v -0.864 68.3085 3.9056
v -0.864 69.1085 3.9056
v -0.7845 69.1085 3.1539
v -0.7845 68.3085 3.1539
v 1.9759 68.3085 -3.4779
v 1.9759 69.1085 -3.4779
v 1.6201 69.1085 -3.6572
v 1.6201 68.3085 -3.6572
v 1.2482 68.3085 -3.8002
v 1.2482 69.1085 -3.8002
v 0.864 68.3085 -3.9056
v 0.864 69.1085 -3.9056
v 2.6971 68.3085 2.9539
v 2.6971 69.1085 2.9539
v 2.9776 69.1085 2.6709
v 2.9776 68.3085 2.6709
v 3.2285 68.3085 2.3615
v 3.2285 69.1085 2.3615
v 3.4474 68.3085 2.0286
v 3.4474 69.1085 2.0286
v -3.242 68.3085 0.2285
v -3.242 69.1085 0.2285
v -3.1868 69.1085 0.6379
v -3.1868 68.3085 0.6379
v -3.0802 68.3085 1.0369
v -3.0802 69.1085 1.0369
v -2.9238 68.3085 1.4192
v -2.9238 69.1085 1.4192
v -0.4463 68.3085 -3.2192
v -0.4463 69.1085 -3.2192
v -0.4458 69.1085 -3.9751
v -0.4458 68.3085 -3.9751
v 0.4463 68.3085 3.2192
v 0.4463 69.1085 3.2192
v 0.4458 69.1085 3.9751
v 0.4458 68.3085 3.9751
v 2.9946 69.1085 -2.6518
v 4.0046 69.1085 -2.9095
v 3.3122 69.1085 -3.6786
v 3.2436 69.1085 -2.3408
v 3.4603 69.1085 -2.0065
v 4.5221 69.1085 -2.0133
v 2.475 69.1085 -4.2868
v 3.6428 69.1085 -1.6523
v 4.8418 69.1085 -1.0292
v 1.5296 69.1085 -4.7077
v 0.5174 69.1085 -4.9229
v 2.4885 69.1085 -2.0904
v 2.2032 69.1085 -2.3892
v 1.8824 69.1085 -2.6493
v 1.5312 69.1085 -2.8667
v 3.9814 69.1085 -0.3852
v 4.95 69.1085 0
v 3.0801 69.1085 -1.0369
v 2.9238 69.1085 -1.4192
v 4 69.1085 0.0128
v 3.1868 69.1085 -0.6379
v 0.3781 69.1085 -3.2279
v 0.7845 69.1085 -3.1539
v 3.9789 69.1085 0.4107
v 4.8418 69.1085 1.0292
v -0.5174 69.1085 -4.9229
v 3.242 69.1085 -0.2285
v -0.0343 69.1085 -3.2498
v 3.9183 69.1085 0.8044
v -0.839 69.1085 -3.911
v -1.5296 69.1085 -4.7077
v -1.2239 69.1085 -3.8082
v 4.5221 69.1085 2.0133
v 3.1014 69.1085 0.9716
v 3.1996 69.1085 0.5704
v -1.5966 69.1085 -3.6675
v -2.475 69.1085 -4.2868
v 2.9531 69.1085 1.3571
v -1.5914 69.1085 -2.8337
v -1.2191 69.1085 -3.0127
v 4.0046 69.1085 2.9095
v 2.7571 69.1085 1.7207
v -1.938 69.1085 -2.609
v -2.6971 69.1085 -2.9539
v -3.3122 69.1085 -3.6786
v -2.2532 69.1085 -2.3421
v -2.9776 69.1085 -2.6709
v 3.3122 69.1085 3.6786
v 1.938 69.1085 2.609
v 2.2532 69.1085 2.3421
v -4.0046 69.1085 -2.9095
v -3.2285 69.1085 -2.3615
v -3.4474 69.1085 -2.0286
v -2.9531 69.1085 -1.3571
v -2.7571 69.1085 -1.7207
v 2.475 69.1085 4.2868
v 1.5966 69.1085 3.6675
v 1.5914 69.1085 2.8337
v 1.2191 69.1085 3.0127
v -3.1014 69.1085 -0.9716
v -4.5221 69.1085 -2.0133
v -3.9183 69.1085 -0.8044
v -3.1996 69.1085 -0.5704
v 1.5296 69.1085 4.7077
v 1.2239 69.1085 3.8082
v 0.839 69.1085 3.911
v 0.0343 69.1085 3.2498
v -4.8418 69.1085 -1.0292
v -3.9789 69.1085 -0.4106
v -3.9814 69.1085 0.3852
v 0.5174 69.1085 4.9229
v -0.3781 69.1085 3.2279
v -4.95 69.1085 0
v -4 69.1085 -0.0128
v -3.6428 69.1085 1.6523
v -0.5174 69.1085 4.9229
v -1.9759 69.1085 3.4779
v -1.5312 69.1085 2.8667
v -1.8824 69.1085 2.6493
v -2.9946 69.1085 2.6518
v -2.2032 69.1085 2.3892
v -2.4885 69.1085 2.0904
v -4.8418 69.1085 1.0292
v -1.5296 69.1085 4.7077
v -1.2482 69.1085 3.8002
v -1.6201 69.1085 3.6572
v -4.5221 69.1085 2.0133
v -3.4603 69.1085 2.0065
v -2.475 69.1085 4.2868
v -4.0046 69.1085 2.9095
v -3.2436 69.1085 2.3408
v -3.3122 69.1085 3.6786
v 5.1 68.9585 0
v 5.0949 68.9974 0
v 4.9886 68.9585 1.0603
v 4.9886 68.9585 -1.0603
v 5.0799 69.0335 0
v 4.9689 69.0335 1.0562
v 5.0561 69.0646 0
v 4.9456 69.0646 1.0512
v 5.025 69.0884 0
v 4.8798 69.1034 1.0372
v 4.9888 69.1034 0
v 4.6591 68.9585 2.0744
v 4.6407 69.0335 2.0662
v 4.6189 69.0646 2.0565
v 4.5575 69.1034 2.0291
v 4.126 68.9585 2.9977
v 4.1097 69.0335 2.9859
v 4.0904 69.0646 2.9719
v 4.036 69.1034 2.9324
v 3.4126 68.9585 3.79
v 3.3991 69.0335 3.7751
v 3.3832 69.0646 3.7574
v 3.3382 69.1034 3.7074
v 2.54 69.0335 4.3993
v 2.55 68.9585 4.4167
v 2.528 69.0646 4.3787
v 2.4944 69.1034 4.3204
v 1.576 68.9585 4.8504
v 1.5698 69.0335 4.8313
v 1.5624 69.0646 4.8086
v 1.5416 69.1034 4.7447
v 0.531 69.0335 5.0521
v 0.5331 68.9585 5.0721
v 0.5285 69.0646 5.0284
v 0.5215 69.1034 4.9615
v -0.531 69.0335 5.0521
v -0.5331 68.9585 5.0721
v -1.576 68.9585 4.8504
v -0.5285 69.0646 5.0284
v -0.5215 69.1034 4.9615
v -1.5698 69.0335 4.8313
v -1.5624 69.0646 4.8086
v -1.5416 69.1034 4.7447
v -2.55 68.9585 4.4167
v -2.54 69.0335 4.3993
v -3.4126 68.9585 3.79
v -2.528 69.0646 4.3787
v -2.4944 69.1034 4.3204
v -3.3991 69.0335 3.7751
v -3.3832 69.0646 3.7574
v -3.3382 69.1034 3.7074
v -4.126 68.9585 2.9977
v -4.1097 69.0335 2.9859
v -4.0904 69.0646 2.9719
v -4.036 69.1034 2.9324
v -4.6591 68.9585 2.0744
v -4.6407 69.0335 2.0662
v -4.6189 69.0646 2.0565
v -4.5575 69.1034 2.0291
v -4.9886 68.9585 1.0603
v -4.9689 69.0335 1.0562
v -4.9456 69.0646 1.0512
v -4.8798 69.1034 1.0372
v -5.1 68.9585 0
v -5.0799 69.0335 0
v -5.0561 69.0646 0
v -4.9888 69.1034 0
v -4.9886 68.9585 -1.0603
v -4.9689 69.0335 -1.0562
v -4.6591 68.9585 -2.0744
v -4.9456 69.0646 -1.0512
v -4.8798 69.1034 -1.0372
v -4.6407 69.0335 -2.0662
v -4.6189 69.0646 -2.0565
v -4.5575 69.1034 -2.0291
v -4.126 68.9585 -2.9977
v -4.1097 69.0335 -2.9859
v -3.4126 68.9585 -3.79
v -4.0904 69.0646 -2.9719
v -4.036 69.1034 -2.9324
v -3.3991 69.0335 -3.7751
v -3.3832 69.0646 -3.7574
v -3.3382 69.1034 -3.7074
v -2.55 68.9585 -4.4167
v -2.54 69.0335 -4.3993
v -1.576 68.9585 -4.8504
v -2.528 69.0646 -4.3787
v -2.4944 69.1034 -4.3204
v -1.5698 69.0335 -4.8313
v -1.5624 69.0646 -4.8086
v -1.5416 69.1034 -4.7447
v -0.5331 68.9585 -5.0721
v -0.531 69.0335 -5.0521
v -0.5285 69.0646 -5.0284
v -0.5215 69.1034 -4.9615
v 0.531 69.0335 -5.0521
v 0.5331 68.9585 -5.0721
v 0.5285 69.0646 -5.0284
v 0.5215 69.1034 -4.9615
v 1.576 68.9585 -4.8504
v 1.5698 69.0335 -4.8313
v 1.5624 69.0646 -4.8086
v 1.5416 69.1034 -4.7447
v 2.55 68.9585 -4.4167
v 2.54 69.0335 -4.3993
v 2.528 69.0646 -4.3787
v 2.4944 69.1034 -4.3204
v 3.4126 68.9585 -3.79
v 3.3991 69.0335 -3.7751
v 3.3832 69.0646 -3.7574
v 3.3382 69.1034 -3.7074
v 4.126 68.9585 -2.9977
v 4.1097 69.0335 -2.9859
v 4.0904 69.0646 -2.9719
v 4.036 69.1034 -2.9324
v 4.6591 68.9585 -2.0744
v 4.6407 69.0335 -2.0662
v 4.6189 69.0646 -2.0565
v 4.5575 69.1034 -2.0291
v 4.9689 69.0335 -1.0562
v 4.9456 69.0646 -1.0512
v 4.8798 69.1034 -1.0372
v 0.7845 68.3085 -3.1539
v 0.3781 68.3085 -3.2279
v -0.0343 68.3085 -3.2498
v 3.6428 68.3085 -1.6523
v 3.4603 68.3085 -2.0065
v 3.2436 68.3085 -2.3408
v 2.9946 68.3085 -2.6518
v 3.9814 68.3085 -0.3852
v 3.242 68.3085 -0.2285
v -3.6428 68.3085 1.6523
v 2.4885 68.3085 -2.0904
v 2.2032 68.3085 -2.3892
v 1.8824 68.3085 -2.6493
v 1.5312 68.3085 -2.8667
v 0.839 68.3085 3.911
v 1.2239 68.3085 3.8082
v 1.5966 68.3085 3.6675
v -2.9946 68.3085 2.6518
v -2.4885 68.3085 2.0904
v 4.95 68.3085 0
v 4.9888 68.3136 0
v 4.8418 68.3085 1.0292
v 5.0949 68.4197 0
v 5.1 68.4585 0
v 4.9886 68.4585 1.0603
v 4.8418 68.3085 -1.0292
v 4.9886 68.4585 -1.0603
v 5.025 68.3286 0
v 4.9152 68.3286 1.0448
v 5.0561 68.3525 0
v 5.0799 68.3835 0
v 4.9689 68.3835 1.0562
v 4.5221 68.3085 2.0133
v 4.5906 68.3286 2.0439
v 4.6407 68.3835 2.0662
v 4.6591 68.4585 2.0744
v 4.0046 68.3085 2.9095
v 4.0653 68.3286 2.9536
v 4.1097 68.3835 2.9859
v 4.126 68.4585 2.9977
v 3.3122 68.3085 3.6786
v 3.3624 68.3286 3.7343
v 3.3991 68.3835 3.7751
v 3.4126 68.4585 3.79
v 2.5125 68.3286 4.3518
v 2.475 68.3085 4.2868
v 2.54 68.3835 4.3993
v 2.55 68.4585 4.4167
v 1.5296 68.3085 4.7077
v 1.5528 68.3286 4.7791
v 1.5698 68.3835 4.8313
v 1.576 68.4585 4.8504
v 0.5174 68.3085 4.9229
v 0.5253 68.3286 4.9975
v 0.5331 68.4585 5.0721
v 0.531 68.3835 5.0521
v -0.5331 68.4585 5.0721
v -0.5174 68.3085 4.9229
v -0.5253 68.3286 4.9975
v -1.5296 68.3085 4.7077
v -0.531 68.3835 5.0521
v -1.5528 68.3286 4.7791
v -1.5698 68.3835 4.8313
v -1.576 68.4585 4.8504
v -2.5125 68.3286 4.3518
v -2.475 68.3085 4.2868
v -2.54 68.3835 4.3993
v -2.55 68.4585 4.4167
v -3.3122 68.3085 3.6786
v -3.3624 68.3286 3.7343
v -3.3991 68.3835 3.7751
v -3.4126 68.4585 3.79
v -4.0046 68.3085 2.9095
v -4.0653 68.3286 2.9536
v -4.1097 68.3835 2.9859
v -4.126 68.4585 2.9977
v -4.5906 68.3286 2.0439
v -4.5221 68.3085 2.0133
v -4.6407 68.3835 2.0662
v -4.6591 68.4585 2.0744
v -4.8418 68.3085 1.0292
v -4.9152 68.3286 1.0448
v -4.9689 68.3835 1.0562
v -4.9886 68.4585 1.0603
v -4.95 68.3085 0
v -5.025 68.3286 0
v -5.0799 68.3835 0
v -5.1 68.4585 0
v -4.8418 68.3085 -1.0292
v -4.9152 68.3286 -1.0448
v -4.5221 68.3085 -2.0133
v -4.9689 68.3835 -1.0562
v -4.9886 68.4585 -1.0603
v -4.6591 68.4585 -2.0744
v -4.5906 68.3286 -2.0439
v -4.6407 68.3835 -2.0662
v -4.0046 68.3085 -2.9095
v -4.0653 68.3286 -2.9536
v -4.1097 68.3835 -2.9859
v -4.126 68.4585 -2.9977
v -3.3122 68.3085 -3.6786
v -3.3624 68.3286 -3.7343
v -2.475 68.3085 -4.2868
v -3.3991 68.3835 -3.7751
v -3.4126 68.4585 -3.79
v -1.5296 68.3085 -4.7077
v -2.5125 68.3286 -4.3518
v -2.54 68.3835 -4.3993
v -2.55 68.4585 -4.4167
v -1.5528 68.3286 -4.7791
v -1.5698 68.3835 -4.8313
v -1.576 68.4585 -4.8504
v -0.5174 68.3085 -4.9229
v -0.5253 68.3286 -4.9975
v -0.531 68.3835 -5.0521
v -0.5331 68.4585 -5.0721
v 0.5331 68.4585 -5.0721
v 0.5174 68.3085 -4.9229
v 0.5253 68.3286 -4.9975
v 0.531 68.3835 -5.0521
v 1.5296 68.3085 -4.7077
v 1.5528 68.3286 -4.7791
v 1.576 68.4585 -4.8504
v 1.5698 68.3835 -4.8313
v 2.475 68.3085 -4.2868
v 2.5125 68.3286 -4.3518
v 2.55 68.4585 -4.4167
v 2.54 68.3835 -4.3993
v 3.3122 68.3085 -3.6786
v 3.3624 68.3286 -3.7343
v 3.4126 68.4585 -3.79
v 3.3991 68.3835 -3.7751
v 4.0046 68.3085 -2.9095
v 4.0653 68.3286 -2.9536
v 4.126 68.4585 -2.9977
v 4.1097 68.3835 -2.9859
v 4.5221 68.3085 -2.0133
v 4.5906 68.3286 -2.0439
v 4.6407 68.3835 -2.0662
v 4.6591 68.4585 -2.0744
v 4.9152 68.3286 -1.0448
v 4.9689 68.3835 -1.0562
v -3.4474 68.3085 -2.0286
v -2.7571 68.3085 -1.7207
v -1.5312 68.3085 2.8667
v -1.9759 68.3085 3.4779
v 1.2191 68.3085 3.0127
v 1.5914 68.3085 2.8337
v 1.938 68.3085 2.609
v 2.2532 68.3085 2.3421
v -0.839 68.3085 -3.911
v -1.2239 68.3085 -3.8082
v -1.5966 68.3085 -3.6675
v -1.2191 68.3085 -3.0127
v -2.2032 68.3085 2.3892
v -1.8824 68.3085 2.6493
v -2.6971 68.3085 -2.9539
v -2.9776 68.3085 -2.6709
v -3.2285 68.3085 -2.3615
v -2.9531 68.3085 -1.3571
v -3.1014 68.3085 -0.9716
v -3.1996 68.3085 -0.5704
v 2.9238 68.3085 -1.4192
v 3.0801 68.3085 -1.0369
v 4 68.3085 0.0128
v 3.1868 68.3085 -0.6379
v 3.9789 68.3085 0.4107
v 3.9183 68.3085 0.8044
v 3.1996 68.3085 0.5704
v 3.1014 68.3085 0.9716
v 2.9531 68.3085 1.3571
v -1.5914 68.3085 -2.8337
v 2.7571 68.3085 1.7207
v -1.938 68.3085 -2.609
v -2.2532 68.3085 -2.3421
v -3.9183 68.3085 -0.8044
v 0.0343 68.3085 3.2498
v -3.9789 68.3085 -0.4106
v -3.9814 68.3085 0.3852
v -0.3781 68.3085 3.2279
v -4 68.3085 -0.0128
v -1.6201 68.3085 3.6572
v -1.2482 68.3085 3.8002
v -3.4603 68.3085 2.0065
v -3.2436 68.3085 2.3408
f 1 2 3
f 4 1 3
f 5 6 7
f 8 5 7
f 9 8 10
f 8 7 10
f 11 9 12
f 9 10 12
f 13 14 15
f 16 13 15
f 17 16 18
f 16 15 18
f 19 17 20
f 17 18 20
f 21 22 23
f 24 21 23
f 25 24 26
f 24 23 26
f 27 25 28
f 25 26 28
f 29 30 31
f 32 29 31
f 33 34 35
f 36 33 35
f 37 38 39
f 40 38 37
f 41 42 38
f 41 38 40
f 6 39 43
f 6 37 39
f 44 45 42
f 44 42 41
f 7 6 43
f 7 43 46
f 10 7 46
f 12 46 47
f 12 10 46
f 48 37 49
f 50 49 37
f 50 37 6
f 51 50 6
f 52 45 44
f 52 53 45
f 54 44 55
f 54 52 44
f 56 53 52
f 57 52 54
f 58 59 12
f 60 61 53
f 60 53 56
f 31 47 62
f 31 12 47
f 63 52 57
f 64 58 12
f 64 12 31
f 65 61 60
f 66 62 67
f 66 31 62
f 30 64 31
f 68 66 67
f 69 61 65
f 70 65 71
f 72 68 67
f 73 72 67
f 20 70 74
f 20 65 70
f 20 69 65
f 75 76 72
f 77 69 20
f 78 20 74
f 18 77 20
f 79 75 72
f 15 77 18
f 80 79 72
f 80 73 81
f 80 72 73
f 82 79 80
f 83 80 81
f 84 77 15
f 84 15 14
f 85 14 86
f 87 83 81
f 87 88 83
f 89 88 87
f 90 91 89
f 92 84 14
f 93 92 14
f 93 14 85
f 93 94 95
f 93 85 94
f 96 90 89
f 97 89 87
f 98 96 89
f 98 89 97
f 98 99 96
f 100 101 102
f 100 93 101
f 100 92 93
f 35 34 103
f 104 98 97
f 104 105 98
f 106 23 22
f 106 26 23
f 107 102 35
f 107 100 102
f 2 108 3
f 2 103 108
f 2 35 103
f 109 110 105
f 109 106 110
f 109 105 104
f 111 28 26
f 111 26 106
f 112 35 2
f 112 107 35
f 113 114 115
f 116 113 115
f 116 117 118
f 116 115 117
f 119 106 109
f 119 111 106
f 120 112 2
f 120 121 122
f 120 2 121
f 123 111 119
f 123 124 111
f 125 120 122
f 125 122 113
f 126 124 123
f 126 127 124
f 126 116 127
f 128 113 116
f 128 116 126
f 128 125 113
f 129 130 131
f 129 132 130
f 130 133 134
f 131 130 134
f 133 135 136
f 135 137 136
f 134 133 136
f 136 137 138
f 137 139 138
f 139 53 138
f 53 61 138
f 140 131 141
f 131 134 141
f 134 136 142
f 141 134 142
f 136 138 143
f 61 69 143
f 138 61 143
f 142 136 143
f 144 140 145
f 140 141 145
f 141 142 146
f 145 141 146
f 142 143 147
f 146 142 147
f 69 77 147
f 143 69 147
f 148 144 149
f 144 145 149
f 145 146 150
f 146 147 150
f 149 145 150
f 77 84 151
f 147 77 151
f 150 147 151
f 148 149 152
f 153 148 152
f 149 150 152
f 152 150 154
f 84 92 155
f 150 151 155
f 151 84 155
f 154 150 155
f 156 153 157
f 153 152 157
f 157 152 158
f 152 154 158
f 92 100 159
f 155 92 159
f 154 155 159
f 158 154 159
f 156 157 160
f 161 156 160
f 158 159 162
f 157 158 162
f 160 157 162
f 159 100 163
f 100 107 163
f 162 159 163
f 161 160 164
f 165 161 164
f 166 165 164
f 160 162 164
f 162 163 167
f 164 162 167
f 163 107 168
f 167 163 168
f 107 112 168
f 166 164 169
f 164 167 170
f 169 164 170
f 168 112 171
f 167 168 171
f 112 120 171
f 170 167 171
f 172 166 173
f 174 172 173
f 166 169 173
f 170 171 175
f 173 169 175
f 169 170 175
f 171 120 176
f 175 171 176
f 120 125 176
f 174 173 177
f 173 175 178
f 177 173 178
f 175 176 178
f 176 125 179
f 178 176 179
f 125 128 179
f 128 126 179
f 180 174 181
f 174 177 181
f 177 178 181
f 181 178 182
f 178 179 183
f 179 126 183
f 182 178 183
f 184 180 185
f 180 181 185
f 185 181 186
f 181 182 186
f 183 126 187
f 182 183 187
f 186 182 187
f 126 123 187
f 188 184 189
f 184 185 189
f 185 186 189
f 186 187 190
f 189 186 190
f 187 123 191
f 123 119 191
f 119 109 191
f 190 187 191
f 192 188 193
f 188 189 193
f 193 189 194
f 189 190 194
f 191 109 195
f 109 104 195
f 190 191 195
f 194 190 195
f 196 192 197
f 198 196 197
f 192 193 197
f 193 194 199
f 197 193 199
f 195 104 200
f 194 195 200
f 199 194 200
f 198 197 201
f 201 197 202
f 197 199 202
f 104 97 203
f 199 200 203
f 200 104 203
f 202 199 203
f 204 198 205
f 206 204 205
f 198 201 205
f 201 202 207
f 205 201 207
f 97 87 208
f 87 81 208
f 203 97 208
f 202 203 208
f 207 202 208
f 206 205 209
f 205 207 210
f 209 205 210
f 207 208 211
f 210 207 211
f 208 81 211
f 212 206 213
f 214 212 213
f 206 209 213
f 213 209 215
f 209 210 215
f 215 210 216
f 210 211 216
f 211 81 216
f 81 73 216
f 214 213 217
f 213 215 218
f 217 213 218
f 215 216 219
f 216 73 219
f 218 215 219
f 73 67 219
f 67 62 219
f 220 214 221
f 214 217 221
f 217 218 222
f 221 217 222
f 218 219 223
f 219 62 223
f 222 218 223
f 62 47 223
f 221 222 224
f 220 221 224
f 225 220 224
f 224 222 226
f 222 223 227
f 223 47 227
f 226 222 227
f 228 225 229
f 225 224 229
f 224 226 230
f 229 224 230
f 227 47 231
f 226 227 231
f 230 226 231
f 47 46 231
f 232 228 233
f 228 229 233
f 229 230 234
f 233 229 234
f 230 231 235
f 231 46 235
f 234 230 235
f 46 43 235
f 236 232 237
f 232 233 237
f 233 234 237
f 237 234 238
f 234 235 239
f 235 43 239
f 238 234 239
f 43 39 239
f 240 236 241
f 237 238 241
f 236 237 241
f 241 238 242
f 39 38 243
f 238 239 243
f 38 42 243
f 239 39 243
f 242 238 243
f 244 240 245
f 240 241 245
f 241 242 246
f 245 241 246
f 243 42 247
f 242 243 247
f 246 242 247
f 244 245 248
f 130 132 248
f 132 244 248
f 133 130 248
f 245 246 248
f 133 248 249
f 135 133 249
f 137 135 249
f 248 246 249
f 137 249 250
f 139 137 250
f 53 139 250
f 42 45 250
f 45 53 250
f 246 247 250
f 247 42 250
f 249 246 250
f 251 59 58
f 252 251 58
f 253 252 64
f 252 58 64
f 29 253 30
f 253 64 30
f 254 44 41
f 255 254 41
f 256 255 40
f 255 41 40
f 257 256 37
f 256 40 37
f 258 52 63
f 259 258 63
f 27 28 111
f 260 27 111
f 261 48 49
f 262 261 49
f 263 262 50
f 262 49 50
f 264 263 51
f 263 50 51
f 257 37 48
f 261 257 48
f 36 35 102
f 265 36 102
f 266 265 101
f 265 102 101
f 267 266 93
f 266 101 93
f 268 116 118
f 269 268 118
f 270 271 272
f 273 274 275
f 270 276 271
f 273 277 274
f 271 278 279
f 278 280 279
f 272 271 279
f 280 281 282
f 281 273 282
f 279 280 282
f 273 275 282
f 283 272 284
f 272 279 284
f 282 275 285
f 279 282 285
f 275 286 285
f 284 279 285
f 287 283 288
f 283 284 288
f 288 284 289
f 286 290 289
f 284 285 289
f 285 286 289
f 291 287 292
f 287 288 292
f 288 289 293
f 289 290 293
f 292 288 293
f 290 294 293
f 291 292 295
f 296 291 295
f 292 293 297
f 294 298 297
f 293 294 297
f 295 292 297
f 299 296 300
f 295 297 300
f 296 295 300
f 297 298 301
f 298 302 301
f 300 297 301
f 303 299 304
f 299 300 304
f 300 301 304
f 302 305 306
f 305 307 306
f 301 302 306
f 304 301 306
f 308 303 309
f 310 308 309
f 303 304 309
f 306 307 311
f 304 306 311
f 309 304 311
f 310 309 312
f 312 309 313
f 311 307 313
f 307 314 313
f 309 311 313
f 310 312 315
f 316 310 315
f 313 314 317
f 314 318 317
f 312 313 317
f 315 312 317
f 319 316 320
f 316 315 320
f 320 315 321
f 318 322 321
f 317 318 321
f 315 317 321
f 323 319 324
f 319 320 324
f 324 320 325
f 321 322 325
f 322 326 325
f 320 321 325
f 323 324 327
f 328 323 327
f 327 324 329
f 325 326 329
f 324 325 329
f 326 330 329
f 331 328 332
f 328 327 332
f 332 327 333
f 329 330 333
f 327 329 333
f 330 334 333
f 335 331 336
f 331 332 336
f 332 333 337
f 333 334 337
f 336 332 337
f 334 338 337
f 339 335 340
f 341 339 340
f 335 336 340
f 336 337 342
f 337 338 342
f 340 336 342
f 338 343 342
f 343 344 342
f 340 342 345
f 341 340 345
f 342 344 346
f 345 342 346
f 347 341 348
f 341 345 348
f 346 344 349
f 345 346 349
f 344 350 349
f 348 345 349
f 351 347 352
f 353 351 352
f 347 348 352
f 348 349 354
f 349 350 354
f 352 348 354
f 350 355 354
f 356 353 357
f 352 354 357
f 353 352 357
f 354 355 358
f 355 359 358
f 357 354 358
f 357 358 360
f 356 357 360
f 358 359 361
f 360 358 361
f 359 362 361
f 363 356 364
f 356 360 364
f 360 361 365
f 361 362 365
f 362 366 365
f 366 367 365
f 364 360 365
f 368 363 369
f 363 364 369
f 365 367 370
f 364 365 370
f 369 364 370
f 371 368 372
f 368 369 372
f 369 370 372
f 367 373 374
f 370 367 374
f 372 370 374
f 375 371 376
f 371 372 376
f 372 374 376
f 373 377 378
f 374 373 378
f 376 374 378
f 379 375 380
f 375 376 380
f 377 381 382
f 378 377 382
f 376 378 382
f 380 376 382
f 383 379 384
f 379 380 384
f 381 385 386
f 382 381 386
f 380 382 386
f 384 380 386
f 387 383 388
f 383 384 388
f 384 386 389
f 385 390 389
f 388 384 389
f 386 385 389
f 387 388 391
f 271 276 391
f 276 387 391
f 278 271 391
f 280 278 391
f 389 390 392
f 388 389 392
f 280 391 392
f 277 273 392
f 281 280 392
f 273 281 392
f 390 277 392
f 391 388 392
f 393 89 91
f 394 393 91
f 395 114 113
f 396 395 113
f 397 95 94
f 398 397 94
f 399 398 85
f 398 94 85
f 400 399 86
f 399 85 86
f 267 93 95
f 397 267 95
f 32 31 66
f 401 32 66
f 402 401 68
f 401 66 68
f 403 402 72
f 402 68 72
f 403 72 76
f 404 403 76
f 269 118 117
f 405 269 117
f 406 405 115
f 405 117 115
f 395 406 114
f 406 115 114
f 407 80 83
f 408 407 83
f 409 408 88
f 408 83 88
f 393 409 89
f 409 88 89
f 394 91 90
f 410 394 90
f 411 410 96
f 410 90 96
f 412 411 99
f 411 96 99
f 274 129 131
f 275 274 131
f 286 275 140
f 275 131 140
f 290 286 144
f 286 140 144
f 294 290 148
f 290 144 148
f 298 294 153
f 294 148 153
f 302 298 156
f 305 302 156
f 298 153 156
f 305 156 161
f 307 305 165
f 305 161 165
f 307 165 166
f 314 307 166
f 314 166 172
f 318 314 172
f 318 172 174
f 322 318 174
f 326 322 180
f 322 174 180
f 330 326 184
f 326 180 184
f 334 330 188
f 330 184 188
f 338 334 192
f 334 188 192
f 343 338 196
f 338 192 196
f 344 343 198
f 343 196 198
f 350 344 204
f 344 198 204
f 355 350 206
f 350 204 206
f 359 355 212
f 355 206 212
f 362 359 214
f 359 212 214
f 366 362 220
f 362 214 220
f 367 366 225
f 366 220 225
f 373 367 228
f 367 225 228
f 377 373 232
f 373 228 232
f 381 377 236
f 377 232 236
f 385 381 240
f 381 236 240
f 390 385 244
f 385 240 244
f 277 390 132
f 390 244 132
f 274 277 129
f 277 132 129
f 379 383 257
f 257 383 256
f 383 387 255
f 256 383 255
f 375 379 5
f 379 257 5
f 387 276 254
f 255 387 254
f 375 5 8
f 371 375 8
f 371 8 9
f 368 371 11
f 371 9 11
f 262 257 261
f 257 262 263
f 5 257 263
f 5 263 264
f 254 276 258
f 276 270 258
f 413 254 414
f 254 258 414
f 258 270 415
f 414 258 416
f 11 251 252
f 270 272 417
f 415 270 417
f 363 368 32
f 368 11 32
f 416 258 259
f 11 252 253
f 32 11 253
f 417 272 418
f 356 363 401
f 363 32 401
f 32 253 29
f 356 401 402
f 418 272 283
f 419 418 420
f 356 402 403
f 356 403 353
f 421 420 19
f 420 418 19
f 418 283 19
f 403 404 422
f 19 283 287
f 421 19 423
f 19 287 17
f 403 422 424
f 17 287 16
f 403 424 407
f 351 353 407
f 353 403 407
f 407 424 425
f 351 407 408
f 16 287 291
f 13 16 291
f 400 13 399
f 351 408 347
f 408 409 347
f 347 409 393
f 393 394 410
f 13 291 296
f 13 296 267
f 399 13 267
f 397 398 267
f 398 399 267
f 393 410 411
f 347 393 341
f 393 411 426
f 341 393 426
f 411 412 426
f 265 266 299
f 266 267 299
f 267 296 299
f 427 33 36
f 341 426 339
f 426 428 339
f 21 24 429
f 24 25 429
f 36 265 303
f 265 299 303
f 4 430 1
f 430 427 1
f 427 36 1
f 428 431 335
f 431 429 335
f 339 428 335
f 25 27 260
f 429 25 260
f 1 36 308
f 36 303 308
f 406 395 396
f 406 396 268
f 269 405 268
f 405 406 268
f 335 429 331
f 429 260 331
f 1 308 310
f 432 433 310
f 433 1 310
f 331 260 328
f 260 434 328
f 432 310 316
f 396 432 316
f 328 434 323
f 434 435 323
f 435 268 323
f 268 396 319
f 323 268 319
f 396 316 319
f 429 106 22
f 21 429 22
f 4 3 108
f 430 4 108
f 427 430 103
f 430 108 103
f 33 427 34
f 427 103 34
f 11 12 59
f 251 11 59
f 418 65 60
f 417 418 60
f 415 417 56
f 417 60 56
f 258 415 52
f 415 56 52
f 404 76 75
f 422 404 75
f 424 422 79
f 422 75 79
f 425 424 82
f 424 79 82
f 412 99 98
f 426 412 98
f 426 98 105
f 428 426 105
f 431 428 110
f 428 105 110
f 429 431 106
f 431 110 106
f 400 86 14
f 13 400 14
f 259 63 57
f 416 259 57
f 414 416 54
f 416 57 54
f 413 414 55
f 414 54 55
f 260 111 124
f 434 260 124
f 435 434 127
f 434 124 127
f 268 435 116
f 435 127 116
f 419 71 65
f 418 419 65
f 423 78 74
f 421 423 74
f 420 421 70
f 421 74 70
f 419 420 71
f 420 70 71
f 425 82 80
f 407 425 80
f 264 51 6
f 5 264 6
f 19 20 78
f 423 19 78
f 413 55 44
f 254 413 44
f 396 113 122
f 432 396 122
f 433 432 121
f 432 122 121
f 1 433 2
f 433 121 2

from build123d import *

# Parameters (mm, degrees)
SKETCH_1_W          = 5.1
SKETCH_1_H          = 0.8
CUT_EXTRUDE_1_DEPTH = 8.256721023
FILLET_1_R          = 0.15


with BuildPart() as part:
    # 草图1 → 旋转1 (revolve)
    with BuildSketch(Plane.XY):
        with Locations((2.55, 68.708527966)):
            Rectangle(SKETCH_1_W, SKETCH_1_H)
    revolve(axis=Axis((0, 69.108527966, 0), (0, -1, 0)))

    # 草图2 → 切除-拉伸1 (cut, through all)
    with BuildSketch(Plane(origin=(0, 69.108527966, 0), x_dir=(-1, 0, 0), z_dir=(0, 1, 0))):
        with BuildLine():
            Line((-3.199553455, 0.570374573), (-3.918273635, 0.804424081))
            ThreePointArc((-3.918273635, 0.804424081), (-3.994373733, 0.21199127), (-3.981407211, -0.385168448))
            Line((-3.981407211, -0.385168448), (-3.241952523, -0.228501177))
            ThreePointArc((-3.241952523, -0.228501177), (-3.139811906, -0.839077143), (-2.923750279, -1.419209101))
            Line((-2.923750279, -1.419209101), (-3.642772796, -1.65232263))
            ThreePointArc((-3.642772796, -1.65232263), (-3.356118206, -2.176334942), (-2.994630559, -2.651820418))
            Line((-2.994630559, -2.651820418), (-2.488484708, -2.090434413))
            ThreePointArc((-2.488484708, -2.090434413), (-2.046963571, -2.524364167), (-1.531172889, -2.866703062))
            Line((-1.531172889, -2.866703062), (-1.975859509, -3.477924527))
            ThreePointArc((-1.975859509, -3.477924527), (-1.435936071, -3.733365668), (-0.863994936, -3.905559842))
            Line((-0.863994936, -3.905559842), (-0.784496864, -3.153893672))
            ThreePointArc((-0.784496864, -3.153893672), (-0.172242423, -3.245430066), (0.446261515, -3.219213824))
            Line((0.446261515, -3.219213824), (0.445759758, -3.975082601))
            ThreePointArc((0.445759758, -3.975082601), (1.032712913, -3.864387477), (1.596638706, -3.667524283))
            Line((1.596638706, -3.667524283), (1.219138949, -3.012671786))
            ThreePointArc((1.219138949, -3.012671786), (1.768268328, -2.726851874), (2.253240152, -2.342094254))
            Line((2.253240152, -2.342094254), (2.697131397, -2.953893593))
            ThreePointArc((2.697131397, -2.953893593), (3.106915443, -2.519331172), (3.447420884, -2.028593455))
            Line((3.447420884, -2.028593455), (2.75711029, -1.720709844))
            ThreePointArc((2.75711029, -1.720709844), (3.033363561, -1.166707614), (3.199558641, -0.570374203))
            Line((3.199558641, -0.570374203), (3.918278822, -0.80442371))
            ThreePointArc((3.918278822, -0.80442371), (3.994378087, -0.211986219), (3.981409517, 0.385177991))
            Line((3.981409517, 0.385177991), (3.241957709, 0.228501547))
            ThreePointArc((3.241957709, 0.228501547), (3.139817092, 0.83907751), (2.923755466, 1.419209465))
            Line((2.923755466, 1.419209465), (3.642783633, 1.65231108))
            ThreePointArc((3.642783633, 1.65231108), (3.356126982, 2.176329766), (2.994635746, 2.651820782))
            Line((2.994635746, 2.651820782), (2.488489895, 2.090434778))
            ThreePointArc((2.488489895, 2.090434778), (2.046968759, 2.524364531), (1.531178079, 2.866703425))
            Line((1.531178079, 2.866703425), (1.975864699, 3.477924889))
            ThreePointArc((1.975864699, 3.477924889), (1.435941262, 3.733366031), (0.864000127, 3.905560207))
            Line((0.864000127, 3.905560207), (0.784502055, 3.153894037))
            ThreePointArc((0.784502055, 3.153894037), (0.172247613, 3.245430432), (-0.446256324, 3.21921419))
            Line((-0.446256324, 3.21921419), (-0.445754567, 3.975082967))
            ThreePointArc((-0.445754567, 3.975082967), (-1.032707749, 3.864387836), (-1.596633567, 3.667524629))
            Line((-1.596633567, 3.667524629), (-1.219133759, 3.012672153))
            ThreePointArc((-1.219133759, 3.012672153), (-1.768263138, 2.726852242), (-2.253234963, 2.342094623))
            Line((-2.253234963, 2.342094623), (-2.697126207, 2.953893962))
            ThreePointArc((-2.697126207, 2.953893962), (-3.106910254, 2.519331541), (-3.447415696, 2.028593825))
            Line((-3.447415696, 2.028593825), (-2.757105101, 1.720710213))
            ThreePointArc((-2.757105101, 1.720710213), (-3.033358374, 1.166707983), (-3.199553455, 0.570374573))
        make_face()
    extrude(amount=-CUT_EXTRUDE_1_DEPTH, mode=Mode.SUBTRACT)

    # 圆角1
    fillet_1_edges = [part.edges().sort_by_distance(p)[0] for p in [
        (-5.1, 68.308527966, 0),
        (-5.1, 69.108527966, 0),
    ]]
    fillet(fillet_1_edges, radius=FILLET_1_R)


solid = part.part
